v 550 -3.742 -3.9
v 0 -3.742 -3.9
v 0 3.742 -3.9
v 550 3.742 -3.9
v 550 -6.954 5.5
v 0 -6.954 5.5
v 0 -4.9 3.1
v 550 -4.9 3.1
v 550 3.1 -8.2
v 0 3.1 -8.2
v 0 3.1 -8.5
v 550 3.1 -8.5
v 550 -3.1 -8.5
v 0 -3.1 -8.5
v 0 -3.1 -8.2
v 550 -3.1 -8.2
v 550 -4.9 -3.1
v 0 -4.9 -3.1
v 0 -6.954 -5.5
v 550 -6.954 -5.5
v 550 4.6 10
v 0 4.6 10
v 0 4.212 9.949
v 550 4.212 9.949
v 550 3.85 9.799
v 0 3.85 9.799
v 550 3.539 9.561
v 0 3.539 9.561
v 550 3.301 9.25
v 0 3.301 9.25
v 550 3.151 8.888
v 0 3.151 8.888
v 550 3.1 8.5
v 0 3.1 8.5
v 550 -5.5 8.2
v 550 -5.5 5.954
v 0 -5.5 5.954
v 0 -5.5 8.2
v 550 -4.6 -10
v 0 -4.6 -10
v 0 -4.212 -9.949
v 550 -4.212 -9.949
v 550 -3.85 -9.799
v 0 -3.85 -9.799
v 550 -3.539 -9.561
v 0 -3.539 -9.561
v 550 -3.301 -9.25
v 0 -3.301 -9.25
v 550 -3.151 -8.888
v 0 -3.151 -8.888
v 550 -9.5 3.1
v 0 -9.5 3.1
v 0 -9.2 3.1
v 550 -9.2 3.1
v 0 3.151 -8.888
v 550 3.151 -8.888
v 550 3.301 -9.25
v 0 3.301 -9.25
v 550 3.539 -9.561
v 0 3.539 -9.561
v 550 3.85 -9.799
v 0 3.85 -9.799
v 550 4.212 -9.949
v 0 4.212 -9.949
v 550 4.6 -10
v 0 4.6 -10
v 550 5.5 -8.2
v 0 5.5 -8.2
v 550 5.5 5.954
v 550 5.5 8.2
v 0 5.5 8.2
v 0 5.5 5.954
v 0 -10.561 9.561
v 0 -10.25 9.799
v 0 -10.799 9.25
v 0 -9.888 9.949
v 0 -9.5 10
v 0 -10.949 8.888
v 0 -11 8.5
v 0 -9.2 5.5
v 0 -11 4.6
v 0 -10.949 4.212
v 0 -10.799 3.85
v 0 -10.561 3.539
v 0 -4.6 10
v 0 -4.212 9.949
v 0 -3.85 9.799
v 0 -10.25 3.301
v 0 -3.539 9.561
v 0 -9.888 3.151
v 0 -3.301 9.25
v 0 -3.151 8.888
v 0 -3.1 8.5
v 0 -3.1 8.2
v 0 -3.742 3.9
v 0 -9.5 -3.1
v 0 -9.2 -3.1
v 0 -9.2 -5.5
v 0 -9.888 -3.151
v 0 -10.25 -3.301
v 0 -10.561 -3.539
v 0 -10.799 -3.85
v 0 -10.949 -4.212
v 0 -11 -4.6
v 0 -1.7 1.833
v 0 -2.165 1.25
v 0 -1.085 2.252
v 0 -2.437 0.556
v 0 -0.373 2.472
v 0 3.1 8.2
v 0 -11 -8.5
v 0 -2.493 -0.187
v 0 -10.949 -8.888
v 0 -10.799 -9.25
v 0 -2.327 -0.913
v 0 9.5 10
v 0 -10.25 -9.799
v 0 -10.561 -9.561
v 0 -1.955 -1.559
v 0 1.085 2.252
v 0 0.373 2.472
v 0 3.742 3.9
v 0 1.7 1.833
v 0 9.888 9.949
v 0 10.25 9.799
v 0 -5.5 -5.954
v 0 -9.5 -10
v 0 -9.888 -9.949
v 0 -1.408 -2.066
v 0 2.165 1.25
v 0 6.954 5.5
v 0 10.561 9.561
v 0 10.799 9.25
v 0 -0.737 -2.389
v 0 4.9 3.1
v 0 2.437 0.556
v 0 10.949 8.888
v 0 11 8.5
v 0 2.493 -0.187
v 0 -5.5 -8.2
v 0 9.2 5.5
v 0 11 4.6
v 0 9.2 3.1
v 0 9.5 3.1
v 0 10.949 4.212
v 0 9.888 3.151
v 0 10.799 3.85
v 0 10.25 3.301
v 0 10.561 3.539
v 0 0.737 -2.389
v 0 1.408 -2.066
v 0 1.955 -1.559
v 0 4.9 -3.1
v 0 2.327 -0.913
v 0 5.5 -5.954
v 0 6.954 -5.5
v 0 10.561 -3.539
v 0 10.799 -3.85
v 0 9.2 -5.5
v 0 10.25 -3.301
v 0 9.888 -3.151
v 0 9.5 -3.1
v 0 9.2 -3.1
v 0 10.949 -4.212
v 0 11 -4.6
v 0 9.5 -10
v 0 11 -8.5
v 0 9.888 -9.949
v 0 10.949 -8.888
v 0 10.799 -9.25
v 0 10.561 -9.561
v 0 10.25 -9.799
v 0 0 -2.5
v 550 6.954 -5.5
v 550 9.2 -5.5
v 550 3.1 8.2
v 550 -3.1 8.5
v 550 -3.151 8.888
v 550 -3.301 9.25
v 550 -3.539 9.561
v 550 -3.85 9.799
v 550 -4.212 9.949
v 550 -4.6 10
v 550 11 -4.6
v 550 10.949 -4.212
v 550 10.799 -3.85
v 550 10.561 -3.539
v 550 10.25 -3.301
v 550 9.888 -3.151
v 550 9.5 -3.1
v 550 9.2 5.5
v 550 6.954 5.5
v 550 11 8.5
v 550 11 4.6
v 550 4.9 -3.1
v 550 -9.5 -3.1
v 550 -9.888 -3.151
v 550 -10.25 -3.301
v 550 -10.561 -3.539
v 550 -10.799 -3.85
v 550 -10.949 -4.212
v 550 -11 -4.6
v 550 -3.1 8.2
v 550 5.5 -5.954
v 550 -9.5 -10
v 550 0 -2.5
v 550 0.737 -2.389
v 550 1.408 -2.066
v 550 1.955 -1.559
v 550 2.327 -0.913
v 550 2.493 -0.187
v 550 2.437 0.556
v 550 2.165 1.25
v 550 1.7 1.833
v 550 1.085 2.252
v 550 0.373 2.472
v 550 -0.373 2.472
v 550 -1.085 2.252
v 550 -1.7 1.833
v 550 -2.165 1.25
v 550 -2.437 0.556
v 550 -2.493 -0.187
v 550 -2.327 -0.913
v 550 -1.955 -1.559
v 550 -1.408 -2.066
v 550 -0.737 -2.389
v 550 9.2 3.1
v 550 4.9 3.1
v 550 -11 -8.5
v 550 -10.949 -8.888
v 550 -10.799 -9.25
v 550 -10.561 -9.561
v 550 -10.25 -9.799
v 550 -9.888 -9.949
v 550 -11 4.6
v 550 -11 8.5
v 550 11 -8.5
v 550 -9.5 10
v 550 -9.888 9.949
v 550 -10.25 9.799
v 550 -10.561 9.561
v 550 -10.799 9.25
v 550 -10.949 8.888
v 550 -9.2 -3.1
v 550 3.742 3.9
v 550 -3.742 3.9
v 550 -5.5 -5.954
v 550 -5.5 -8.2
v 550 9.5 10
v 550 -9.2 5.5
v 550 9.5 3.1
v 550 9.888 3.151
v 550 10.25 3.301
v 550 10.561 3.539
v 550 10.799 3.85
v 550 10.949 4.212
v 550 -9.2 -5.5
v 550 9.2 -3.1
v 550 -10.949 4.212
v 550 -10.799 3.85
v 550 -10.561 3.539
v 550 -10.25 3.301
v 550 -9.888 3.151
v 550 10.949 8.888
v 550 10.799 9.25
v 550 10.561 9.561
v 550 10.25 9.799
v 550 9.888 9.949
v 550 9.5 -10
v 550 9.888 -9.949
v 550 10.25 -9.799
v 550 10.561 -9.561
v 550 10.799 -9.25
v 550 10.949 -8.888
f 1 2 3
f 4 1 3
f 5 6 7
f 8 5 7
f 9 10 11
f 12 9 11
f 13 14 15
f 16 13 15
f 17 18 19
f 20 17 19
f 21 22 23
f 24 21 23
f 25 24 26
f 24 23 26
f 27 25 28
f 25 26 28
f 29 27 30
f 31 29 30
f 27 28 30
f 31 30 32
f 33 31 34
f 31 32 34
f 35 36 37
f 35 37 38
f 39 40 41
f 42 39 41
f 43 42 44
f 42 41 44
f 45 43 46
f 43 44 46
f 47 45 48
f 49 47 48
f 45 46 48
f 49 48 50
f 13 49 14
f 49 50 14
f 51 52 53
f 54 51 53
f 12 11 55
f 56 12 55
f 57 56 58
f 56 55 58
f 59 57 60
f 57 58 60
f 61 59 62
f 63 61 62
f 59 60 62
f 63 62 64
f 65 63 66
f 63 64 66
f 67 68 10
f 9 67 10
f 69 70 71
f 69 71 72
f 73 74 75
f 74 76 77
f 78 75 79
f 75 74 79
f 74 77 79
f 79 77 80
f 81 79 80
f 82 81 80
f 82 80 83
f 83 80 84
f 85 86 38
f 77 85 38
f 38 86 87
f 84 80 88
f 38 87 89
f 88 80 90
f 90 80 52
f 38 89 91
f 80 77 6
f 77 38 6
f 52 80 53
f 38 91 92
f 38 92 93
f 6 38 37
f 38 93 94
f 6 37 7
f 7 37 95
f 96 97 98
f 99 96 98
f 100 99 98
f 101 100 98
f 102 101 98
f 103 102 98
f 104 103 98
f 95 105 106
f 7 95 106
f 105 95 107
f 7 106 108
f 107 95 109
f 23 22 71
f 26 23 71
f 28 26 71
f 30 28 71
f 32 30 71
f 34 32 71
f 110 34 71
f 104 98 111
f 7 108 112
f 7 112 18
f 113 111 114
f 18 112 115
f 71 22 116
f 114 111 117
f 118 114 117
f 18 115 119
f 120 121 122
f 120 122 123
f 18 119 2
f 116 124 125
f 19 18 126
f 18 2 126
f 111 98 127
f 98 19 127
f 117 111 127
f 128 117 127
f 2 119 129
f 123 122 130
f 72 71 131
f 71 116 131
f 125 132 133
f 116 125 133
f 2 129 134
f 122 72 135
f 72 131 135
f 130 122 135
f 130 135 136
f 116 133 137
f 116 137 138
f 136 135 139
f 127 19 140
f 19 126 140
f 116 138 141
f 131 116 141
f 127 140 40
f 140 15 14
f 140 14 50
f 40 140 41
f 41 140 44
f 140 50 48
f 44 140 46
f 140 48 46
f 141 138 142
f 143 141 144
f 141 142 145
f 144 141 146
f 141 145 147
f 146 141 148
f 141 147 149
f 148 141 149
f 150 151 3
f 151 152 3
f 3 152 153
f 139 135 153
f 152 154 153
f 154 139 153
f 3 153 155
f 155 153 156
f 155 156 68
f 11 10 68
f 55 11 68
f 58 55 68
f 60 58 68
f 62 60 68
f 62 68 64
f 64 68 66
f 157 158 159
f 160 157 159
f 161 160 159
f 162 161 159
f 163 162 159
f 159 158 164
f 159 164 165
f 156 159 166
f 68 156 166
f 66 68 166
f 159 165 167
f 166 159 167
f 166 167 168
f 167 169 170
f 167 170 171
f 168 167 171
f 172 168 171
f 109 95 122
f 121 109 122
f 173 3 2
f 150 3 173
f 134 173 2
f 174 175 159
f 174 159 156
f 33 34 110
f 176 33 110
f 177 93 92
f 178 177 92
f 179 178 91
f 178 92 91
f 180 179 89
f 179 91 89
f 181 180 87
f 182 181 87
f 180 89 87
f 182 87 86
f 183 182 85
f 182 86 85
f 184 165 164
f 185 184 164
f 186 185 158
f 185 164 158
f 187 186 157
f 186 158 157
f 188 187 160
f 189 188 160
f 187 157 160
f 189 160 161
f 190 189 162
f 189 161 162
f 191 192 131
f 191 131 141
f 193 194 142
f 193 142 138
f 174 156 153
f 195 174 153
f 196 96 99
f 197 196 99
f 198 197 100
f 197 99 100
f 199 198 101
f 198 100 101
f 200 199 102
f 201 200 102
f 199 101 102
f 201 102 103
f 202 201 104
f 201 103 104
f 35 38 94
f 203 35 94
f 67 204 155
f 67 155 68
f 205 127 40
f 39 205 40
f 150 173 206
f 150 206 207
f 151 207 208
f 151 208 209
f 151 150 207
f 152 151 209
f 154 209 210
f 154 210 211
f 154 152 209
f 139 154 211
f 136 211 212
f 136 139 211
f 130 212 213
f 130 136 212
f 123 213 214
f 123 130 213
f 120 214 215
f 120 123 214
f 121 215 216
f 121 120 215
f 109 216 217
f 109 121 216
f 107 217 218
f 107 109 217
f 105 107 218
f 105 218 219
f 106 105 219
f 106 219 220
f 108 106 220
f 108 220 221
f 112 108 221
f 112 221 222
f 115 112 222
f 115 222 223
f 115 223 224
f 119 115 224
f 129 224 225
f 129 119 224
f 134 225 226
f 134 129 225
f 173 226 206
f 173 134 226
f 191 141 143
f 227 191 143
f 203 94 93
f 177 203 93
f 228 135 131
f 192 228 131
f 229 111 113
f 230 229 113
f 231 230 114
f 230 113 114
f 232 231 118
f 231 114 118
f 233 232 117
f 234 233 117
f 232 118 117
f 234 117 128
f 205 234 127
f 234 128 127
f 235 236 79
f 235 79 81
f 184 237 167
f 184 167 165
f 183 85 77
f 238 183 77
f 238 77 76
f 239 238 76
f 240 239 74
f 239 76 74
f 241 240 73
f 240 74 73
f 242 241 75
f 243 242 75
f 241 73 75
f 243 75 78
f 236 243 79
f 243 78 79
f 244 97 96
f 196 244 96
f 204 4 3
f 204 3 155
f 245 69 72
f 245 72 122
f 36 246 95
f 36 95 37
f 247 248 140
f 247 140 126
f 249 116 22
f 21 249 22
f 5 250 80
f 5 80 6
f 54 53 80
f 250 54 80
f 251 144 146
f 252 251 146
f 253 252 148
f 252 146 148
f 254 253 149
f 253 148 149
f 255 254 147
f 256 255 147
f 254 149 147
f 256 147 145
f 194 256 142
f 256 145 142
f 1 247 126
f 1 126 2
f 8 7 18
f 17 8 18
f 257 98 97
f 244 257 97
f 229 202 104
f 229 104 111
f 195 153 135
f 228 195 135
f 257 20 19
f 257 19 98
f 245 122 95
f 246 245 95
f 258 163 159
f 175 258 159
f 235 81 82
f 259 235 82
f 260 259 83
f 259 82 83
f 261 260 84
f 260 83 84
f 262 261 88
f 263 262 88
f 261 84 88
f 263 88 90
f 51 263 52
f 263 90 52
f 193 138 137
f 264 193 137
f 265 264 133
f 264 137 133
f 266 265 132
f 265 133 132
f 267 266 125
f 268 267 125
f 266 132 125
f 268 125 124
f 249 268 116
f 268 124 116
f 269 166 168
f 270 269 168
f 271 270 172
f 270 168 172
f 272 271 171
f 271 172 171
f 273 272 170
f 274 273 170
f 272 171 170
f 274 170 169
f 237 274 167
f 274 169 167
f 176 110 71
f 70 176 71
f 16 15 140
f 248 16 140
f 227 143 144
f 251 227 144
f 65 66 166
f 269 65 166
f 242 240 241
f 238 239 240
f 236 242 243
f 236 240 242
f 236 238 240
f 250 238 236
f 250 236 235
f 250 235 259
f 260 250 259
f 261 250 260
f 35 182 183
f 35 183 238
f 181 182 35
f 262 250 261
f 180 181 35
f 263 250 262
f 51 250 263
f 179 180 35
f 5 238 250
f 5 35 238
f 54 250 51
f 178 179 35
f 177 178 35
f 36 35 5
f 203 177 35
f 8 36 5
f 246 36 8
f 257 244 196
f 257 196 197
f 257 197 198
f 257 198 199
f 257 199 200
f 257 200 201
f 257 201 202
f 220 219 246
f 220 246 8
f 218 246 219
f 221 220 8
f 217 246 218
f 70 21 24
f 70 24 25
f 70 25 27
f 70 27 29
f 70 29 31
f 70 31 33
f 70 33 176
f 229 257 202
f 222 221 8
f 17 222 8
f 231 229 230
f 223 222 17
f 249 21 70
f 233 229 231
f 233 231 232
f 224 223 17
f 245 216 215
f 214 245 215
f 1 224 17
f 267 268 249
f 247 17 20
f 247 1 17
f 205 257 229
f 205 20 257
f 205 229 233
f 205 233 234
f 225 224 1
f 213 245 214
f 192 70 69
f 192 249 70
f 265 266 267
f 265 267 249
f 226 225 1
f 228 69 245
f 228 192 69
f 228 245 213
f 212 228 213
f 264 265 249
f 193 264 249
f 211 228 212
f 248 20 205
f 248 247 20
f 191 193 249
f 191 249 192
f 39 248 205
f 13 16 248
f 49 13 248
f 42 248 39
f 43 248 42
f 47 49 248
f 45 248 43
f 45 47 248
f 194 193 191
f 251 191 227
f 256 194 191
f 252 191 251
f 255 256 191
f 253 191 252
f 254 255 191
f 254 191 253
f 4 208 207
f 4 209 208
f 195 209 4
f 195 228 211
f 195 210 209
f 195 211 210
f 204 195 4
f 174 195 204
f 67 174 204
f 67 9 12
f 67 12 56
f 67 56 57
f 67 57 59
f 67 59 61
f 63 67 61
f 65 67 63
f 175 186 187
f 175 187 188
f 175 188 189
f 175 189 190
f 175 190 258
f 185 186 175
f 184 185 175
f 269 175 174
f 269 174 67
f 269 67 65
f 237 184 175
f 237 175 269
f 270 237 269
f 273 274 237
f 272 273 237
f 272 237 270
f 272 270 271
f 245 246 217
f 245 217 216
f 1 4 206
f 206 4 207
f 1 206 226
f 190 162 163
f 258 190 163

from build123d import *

# Parameters (mm, degrees)
SKETCH1_R           = 2.5
BOSS_EXTRUDE1_DEPTH = 550


with BuildPart() as part:
    # Sketch1 → Boss-Extrude1 (new body)
    with BuildSketch(Plane(origin=(0, 0, 0), x_dir=(0, 0, -1), z_dir=(1, 0, 0))):
        with BuildLine():
            Line((-3.1, 4.9), (-5.5, 6.954100836))
            Line((-5.5, 6.954100836), (-5.5, 9.2))
            Line((-5.5, 9.2), (-3.1, 9.2))
            Line((-3.1, 9.2), (-3.1, 9.5))
            ThreePointArc((-3.1, 9.5), (-3.539339828, 10.560660172), (-4.6, 11))
            Line((-4.6, 11), (-8.5, 11))
            ThreePointArc((-8.5, 11), (-9.560660172, 10.560660172), (-10, 9.5))
            Line((-10, 9.5), (-10, 4.6))
            ThreePointArc((-10, 4.6), (-9.560660172, 3.539339828), (-8.5, 3.1))
            Line((-8.5, 3.1), (-8.2, 3.1))
            Line((-8.2, 3.1), (-8.2, 5.5))
            Line((-8.2, 5.5), (-5.954100836, 5.5))
            Line((-5.954100836, 5.5), (-3.9, 3.741945732))
            Line((-3.9, 3.741945732), (-3.9, -3.741945732))
            Line((-3.9, -3.741945732), (-5.954100836, -5.5))
            Line((-5.954100836, -5.5), (-8.2, -5.5))
            Line((-8.2, -5.5), (-8.2, -3.1))
            Line((-8.2, -3.1), (-8.5, -3.1))
            ThreePointArc((-8.5, -3.1), (-9.560660172, -3.539339828), (-10, -4.6))
            Line((-10, -4.6), (-10, -9.5))
            ThreePointArc((-10, -9.5), (-9.560660172, -10.560660172), (-8.5, -11))
            Line((-8.5, -11), (-4.6, -11))
            ThreePointArc((-4.6, -11), (-3.539339828, -10.560660172), (-3.1, -9.5))
            Line((-3.1, -9.5), (-3.1, -9.2))
            Line((-3.1, -9.2), (-5.5, -9.2))
            Line((-5.5, -9.2), (-5.5, -6.954100836))
            Line((-5.5, -6.954100836), (-3.1, -4.9))
            Line((-3.1, -4.9), (3.1, -4.9))
            Line((3.1, -4.9), (5.5, -6.954100836))
            Line((5.5, -6.954100836), (5.5, -9.2))
            Line((5.5, -9.2), (3.1, -9.2))
            Line((3.1, -9.2), (3.1, -9.5))
            ThreePointArc((3.1, -9.5), (3.539339828, -10.560660172), (4.6, -11))
            Line((4.6, -11), (8.5, -11))
            ThreePointArc((8.5, -11), (9.560660172, -10.560660172), (10, -9.5))
            Line((10, -9.5), (10, -4.6))
            ThreePointArc((10, -4.6), (9.560660172, -3.539339828), (8.5, -3.1))
            Line((8.5, -3.1), (8.2, -3.1))
            Line((8.2, -3.1), (8.2, -5.5))
            Line((8.2, -5.5), (5.954100836, -5.5))
            Line((5.954100836, -5.5), (3.9, -3.741945732))
            Line((3.9, -3.741945732), (3.9, 3.741945732))
            Line((3.9, 3.741945732), (5.954100836, 5.5))
            Line((5.954100836, 5.5), (8.2, 5.5))
            Line((8.2, 5.5), (8.2, 3.1))
            Line((8.2, 3.1), (8.5, 3.1))
            ThreePointArc((8.5, 3.1), (9.560660172, 3.539339828), (10, 4.6))
            Line((10, 4.6), (10, 9.5))
            ThreePointArc((10, 9.5), (9.560660172, 10.560660172), (8.5, 11))
            Line((8.5, 11), (4.6, 11))
            ThreePointArc((4.6, 11), (3.539339828, 10.560660172), (3.1, 9.5))
            Line((3.1, 9.5), (3.1, 9.2))
            Line((3.1, 9.2), (5.5, 9.2))
            Line((5.5, 9.2), (5.5, 6.954100836))
            Line((5.5, 6.954100836), (3.1, 4.9))
            Line((3.1, 4.9), (-3.1, 4.9))
        make_face()
        Circle(SKETCH1_R, mode=Mode.SUBTRACT)
    extrude(amount=BOSS_EXTRUDE1_DEPTH)


solid = part.part
